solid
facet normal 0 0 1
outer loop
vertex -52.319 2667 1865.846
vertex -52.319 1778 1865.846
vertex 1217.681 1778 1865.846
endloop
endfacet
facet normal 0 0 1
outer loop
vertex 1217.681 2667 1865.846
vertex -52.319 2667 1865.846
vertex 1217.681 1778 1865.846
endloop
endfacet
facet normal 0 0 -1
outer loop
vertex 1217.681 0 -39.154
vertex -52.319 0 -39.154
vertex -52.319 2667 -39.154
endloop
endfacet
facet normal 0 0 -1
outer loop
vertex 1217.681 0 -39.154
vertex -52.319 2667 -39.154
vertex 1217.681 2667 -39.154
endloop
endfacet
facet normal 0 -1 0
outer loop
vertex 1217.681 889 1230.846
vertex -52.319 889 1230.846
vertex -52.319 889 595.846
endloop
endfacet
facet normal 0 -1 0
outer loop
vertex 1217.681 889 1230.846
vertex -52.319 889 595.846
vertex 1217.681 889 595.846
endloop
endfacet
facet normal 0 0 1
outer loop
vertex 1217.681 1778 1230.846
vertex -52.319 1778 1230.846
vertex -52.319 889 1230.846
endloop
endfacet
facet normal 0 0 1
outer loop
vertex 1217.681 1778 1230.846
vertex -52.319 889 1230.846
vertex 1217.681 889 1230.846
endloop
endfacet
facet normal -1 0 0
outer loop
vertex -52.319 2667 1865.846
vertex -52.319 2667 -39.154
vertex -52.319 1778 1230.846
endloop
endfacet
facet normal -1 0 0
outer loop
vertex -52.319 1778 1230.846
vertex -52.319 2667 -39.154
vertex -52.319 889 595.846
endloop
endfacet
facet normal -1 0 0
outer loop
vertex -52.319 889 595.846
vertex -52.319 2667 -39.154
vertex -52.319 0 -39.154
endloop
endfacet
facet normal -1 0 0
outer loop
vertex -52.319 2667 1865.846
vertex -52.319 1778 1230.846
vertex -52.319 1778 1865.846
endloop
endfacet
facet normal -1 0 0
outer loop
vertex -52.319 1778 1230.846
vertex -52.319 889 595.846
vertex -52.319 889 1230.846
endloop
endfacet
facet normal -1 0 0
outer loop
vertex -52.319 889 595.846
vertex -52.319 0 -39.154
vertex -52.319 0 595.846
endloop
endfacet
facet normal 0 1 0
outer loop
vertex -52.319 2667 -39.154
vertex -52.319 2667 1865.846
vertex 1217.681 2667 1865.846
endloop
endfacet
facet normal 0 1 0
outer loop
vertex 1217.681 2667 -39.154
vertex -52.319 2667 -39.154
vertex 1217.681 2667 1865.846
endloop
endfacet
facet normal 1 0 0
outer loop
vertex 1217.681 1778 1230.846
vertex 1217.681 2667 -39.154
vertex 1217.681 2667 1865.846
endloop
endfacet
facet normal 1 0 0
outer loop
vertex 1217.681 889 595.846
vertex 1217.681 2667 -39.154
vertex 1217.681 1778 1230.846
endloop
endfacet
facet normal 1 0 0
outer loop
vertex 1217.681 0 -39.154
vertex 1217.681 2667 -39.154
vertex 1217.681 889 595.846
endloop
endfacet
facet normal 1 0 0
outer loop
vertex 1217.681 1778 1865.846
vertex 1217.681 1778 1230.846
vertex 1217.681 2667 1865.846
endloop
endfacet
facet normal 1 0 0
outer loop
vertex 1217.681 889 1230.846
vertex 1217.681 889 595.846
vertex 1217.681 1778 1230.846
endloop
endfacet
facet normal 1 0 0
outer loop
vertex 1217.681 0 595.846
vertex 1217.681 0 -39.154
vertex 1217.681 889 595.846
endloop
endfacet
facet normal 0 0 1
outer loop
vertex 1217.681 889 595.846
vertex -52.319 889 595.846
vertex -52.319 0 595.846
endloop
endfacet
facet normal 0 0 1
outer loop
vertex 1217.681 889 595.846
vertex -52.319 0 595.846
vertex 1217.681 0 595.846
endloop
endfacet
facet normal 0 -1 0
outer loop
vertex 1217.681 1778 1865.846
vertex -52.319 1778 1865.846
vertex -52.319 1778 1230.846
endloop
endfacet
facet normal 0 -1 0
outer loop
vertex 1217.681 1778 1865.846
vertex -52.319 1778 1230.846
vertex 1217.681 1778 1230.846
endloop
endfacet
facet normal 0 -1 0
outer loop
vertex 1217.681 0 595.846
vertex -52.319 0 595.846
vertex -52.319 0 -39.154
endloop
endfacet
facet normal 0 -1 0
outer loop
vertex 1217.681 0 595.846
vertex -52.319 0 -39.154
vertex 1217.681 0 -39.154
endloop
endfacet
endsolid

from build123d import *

# Parameters (mm, degrees)
F0_W     = 1270
F0_H     = 1905
F1_DEPTH = 2667
F2_W     = 1270
F2_H     = 889
F3_DEPTH = 1270
F4_W     = 1270
F4_H     = 889
F5_DEPTH = 635


with BuildPart() as f1:
    # F0 (on Front) → F1 (new body)
    with BuildSketch(Plane.XZ):
        with Locations((582.681405, 913.346171)):
            Rectangle(F0_W, F0_H)
    extrude(amount=-F1_DEPTH)

    # F2 (on face) → F3 (cut)
    with BuildSketch(Plane.XY.offset(1865.846171)):
        with Locations((582.681405, 444.5)):
            Rectangle(F2_W, F2_H)
    extrude(amount=-F3_DEPTH, mode=Mode.SUBTRACT)

    # F4 (on face) → F5 (cut)
    with BuildSketch(Plane.XY.offset(1865.846171)):
        with Locations((582.681405, 1333.5)):
            Rectangle(F4_W, F4_H)
    extrude(amount=-F5_DEPTH, mode=Mode.SUBTRACT)


solid = f1.part
